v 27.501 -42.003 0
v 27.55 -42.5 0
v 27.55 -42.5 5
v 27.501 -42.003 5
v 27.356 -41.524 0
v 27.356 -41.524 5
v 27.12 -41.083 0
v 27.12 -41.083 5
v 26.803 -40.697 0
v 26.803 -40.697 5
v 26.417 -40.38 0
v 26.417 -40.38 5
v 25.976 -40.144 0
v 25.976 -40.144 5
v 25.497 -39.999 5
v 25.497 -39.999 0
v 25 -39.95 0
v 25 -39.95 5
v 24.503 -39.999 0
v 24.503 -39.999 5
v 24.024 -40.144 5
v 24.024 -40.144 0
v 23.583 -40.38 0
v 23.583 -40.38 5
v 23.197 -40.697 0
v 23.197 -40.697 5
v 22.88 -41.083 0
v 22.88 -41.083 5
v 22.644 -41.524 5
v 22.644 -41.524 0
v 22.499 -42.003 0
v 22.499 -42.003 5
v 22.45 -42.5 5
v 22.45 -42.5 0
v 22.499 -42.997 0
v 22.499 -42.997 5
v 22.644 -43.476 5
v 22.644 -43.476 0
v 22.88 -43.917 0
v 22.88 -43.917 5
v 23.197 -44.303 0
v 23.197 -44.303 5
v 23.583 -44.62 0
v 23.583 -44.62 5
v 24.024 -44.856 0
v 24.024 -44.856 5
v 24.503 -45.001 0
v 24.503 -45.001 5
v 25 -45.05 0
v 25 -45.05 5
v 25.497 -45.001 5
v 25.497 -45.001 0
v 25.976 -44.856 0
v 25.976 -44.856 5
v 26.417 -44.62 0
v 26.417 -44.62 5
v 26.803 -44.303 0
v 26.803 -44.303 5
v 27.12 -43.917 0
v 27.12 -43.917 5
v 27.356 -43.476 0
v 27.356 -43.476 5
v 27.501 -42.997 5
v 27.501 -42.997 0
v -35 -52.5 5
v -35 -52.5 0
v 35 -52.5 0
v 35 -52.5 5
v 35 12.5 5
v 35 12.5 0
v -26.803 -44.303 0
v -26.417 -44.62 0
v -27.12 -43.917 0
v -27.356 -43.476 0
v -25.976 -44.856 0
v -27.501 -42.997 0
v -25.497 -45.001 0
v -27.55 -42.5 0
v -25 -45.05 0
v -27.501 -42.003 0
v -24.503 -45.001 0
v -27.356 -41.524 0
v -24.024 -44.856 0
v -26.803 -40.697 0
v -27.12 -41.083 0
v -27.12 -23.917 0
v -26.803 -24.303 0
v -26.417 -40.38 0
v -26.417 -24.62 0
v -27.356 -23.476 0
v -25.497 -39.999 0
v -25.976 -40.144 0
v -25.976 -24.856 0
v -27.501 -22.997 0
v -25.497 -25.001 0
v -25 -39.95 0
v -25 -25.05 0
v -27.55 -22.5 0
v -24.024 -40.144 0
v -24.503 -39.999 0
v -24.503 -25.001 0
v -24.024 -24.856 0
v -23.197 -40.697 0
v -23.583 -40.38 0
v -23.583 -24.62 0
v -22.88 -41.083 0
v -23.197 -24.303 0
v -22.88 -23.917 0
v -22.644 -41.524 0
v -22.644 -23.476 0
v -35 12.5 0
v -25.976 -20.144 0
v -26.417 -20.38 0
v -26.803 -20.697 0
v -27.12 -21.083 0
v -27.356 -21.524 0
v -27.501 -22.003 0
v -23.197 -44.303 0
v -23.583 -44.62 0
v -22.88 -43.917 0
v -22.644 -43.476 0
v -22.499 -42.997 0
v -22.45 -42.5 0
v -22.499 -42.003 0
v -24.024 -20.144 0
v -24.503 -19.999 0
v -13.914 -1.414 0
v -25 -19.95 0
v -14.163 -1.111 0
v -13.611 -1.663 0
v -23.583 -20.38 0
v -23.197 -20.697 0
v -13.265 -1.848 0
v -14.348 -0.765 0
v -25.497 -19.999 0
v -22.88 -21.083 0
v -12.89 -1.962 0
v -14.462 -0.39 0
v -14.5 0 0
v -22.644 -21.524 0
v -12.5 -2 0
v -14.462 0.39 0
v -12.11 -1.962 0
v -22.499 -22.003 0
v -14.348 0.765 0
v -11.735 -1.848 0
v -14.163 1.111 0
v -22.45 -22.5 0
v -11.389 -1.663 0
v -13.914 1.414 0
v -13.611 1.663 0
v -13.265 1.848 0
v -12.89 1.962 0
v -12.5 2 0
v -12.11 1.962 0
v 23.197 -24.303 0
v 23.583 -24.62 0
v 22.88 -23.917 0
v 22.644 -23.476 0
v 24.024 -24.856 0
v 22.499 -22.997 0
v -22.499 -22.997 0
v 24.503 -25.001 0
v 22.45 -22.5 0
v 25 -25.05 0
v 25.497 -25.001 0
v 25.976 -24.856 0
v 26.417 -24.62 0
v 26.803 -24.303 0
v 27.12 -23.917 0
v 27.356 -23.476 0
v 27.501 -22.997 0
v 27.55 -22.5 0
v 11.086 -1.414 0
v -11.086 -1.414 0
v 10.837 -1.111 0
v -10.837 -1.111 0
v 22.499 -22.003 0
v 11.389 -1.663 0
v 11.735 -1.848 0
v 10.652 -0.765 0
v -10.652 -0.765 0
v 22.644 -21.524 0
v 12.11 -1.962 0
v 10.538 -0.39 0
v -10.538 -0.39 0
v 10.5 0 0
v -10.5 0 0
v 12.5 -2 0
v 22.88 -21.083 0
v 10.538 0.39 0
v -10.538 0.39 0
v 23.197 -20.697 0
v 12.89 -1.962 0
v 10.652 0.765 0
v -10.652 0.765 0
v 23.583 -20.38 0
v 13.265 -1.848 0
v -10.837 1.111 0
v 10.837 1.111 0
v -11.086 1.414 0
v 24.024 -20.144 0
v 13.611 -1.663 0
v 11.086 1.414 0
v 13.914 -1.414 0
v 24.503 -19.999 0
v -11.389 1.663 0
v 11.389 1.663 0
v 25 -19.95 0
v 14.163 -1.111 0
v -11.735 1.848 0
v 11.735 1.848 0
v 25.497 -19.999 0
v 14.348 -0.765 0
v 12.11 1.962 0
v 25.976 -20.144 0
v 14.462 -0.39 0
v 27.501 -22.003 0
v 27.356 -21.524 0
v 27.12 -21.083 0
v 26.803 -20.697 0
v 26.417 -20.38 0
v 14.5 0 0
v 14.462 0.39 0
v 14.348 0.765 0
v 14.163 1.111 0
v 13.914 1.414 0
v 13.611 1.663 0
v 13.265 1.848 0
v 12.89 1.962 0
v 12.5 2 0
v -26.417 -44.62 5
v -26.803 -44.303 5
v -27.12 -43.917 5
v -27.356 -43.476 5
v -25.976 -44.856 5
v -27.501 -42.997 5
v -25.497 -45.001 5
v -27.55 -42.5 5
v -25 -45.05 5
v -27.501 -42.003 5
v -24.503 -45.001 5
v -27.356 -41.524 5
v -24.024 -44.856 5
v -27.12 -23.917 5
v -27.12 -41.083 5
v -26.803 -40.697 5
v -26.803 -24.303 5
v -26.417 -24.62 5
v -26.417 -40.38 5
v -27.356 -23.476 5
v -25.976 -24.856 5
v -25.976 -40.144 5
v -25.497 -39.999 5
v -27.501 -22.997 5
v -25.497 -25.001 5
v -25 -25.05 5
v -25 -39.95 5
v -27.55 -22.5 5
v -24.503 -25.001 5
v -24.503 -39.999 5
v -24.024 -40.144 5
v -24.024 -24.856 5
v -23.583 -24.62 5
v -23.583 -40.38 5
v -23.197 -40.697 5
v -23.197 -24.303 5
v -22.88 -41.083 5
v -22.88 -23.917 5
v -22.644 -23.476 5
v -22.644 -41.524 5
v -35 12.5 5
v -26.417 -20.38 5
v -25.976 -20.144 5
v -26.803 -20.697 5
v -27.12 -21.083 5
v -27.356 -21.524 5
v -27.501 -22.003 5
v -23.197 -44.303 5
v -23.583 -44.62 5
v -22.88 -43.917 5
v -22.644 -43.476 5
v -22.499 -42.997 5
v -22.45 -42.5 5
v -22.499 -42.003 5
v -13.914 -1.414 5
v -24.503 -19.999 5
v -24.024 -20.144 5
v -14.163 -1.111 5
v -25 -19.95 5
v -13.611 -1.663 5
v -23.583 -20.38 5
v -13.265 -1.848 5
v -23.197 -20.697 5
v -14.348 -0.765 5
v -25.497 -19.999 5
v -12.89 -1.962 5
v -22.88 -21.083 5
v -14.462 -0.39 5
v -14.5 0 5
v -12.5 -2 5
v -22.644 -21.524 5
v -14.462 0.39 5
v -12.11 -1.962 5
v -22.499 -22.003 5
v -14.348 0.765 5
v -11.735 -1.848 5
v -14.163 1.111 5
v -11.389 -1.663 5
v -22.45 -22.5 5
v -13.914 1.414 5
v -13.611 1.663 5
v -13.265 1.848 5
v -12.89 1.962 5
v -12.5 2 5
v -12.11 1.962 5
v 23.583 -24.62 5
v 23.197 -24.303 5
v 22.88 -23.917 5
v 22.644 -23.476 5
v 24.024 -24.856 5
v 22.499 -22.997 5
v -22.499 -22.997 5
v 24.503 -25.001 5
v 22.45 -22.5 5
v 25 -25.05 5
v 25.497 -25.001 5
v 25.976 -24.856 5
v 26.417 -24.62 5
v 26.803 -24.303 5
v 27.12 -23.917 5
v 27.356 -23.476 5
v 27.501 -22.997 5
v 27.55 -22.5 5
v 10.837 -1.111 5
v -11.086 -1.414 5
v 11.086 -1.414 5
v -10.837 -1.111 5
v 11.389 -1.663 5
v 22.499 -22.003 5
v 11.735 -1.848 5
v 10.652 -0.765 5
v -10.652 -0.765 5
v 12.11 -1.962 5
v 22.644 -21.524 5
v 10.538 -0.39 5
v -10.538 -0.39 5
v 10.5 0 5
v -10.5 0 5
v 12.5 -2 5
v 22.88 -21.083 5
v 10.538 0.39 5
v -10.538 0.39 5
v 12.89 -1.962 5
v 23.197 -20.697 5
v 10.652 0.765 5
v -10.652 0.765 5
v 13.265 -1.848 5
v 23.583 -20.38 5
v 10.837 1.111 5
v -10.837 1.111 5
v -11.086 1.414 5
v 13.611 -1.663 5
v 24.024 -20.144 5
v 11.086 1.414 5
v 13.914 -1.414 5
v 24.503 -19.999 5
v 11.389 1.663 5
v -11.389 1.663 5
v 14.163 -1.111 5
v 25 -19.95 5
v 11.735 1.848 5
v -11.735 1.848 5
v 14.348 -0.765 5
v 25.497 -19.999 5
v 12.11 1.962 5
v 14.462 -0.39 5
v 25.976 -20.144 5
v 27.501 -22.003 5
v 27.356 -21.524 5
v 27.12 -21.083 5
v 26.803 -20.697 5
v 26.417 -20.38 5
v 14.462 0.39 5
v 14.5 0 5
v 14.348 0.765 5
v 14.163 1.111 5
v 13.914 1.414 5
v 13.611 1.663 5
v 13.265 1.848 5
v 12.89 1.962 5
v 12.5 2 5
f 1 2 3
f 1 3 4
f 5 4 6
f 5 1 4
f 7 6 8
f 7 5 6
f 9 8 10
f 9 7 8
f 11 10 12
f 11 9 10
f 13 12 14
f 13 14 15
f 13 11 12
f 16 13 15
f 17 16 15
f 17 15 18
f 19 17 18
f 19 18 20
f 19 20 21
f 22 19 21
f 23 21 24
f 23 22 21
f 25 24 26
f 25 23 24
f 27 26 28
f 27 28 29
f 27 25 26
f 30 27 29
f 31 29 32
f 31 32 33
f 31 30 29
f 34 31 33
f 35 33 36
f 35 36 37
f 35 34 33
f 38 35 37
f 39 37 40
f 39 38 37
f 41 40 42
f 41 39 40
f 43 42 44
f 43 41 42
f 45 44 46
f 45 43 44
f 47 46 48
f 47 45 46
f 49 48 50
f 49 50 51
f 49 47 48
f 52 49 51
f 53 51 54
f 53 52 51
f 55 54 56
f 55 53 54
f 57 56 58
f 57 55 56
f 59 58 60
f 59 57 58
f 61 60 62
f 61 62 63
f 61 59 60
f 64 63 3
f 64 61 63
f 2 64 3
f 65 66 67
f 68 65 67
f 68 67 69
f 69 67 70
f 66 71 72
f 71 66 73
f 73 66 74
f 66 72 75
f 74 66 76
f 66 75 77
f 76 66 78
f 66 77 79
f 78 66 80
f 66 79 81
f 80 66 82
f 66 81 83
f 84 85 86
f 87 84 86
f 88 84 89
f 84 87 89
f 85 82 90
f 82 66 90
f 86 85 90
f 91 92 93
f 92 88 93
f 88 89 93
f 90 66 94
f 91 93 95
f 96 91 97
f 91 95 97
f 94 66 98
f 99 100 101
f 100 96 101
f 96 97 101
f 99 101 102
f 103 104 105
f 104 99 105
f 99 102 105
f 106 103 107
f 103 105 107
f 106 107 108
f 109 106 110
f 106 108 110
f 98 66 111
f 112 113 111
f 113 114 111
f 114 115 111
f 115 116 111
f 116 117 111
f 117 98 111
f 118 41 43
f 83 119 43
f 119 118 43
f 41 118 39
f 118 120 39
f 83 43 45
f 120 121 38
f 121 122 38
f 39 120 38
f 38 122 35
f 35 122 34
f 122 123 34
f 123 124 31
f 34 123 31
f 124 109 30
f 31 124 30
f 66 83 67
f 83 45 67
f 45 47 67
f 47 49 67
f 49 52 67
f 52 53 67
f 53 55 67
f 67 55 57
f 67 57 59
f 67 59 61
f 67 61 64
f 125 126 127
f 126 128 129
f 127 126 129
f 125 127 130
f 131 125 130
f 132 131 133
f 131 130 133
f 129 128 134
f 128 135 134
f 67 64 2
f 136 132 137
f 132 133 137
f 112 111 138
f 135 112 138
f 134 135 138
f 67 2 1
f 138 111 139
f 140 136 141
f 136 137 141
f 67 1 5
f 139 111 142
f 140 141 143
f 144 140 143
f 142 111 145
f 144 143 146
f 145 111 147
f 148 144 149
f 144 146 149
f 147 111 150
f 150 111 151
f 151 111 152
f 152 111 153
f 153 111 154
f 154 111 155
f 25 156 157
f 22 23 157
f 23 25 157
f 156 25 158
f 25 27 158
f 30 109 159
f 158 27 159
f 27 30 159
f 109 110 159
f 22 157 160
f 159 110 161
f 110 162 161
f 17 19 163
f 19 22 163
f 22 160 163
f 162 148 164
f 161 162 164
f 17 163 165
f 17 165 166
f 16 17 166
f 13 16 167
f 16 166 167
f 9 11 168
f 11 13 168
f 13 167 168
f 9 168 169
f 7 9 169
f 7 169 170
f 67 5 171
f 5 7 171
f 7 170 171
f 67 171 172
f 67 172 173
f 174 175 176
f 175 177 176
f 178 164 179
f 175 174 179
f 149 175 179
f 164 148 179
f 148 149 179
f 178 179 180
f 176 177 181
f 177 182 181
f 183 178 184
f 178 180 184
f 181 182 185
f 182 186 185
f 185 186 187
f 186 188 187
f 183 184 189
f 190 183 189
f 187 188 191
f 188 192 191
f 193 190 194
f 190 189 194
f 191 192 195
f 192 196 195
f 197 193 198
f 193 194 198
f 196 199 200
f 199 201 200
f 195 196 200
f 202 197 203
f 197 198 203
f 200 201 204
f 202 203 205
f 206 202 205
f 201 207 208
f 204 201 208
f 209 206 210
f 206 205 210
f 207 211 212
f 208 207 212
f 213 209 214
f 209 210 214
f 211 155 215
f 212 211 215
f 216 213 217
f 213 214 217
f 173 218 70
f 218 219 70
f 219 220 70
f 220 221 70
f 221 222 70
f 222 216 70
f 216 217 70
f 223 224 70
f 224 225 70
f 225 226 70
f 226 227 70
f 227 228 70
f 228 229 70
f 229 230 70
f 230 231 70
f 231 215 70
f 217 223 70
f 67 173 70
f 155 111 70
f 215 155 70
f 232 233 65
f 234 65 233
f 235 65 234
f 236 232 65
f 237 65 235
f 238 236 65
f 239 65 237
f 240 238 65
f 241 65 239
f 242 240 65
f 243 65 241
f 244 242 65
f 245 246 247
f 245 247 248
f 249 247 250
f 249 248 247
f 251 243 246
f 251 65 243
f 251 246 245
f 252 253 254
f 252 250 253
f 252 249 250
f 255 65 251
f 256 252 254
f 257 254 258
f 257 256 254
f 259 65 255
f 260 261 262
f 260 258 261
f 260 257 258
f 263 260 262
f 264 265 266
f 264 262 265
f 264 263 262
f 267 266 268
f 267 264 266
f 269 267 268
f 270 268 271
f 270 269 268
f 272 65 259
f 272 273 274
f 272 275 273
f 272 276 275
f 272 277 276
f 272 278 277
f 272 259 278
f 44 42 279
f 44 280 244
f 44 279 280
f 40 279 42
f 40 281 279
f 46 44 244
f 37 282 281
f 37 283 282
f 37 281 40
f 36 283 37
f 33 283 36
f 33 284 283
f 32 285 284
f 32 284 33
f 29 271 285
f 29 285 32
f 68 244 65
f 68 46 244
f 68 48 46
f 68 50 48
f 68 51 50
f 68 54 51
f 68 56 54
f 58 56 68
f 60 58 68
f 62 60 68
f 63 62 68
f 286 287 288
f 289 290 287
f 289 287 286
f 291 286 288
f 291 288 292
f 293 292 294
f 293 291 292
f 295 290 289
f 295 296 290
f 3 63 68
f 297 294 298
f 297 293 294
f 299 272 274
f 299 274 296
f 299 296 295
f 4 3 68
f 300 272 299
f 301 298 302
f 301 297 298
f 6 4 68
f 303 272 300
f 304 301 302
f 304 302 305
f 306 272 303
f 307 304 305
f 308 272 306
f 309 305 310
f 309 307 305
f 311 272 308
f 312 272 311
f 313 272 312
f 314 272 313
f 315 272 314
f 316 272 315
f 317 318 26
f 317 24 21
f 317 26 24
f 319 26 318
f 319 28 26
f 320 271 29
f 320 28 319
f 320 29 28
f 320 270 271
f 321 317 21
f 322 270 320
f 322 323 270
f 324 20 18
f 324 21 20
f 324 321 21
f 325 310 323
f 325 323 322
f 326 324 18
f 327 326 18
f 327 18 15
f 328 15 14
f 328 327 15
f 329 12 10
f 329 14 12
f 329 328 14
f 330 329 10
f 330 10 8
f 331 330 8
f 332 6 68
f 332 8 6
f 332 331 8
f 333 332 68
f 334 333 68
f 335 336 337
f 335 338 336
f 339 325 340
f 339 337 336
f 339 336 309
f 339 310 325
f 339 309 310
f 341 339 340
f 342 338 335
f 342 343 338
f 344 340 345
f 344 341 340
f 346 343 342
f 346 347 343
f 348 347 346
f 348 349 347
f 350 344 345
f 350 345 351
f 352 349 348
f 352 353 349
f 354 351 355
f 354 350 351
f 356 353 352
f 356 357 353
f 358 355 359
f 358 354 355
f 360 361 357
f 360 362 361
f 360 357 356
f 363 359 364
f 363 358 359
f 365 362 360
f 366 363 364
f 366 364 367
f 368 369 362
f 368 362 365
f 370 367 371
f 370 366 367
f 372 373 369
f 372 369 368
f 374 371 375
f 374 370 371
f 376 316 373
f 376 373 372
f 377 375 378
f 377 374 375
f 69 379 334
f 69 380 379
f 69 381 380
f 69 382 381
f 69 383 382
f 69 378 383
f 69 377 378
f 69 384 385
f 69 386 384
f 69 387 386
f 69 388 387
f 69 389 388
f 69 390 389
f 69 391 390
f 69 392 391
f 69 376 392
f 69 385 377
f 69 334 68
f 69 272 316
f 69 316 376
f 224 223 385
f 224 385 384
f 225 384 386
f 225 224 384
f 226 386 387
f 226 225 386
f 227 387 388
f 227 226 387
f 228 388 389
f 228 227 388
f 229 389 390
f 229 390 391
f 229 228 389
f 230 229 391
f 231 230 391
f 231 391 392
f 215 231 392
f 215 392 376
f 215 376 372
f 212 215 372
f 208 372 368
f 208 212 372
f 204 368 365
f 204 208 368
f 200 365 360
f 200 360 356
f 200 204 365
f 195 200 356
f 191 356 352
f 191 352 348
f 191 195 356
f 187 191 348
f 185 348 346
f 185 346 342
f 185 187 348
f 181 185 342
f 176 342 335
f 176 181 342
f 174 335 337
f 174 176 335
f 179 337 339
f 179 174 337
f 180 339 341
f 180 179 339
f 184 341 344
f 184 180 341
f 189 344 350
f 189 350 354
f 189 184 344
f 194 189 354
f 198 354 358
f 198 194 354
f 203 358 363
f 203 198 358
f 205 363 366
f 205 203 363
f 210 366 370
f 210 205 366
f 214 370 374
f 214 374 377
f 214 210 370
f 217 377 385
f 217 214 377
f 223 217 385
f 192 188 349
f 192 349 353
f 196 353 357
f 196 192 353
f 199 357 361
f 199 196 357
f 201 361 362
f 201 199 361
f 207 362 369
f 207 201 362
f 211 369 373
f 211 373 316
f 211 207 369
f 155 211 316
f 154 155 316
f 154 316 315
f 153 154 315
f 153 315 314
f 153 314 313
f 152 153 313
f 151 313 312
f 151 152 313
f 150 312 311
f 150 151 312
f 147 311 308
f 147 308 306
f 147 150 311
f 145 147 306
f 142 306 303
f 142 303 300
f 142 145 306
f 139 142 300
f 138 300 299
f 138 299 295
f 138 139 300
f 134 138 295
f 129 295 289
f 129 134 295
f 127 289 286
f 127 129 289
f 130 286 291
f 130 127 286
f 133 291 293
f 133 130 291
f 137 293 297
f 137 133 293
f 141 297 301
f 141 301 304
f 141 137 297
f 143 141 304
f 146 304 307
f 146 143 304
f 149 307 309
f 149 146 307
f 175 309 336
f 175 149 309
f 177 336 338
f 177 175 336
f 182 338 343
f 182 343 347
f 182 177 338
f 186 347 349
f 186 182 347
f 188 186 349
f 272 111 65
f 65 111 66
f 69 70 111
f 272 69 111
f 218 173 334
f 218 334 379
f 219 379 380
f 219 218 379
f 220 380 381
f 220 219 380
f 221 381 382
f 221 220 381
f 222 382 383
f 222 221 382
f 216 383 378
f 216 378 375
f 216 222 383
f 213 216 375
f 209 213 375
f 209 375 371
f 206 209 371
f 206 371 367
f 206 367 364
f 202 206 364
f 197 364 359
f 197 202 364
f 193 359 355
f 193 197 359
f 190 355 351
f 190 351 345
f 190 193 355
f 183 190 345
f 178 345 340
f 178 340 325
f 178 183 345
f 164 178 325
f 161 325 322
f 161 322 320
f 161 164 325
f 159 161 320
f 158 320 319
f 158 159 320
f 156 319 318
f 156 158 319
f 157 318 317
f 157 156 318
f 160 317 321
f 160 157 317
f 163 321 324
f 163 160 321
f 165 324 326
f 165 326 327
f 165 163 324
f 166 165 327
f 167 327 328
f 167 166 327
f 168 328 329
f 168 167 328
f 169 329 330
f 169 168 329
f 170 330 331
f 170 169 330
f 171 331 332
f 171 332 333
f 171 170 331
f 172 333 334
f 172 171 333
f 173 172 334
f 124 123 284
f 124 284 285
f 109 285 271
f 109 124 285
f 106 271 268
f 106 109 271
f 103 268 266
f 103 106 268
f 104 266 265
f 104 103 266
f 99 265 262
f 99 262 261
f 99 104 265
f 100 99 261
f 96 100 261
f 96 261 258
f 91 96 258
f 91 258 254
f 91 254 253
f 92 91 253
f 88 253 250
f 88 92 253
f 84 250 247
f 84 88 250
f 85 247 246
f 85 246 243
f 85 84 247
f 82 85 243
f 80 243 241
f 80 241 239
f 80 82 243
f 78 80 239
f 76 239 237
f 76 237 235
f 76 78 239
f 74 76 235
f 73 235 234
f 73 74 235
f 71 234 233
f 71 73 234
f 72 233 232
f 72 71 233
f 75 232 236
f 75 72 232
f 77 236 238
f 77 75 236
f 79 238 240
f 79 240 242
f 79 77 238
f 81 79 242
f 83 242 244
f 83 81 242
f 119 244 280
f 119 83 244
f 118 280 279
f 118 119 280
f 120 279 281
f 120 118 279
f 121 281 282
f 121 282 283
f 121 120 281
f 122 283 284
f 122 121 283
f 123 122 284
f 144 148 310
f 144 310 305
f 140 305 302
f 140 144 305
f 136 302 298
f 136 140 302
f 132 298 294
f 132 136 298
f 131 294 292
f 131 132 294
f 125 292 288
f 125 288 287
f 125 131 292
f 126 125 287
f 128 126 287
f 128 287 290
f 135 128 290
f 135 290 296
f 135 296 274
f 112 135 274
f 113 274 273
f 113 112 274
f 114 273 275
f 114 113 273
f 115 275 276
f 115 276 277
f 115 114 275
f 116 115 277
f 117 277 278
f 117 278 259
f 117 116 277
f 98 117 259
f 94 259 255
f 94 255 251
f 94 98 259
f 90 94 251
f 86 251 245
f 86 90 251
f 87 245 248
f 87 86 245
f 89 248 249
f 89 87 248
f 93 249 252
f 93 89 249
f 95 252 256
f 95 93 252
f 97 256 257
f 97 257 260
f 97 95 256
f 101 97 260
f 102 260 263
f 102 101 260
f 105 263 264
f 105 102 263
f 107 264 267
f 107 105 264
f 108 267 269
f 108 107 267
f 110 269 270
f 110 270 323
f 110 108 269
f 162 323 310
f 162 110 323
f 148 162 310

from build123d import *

# Parameters (mm, degrees)
SKETCH1_R           = 2.55
SKETCH1_R_2         = 2
BOSS_EXTRUDE1_DEPTH = 5


with BuildPart() as part:
    # Sketch1 → Boss-Extrude1 (new body)
    with BuildSketch(Plane.XY):
        Polygon((-35, -12.5), (-35, -52.5), (35, -52.5), (35, -12.5), (35, 12.5), (-35, 12.5), align=None)
        with Locations((-25, -22.5)):
            Circle(SKETCH1_R, mode=Mode.SUBTRACT)
        with Locations((-25, -42.5)):
            Circle(SKETCH1_R, mode=Mode.SUBTRACT)
        with Locations((25, -42.5)):
            Circle(SKETCH1_R, mode=Mode.SUBTRACT)
        with Locations((25, -22.5)):
            Circle(SKETCH1_R, mode=Mode.SUBTRACT)
        with Locations((-12.5, 0)):
            Circle(SKETCH1_R_2, mode=Mode.SUBTRACT)
        with Locations((12.5, 0)):
            Circle(SKETCH1_R_2, mode=Mode.SUBTRACT)
    extrude(amount=BOSS_EXTRUDE1_DEPTH)


solid = part.part
